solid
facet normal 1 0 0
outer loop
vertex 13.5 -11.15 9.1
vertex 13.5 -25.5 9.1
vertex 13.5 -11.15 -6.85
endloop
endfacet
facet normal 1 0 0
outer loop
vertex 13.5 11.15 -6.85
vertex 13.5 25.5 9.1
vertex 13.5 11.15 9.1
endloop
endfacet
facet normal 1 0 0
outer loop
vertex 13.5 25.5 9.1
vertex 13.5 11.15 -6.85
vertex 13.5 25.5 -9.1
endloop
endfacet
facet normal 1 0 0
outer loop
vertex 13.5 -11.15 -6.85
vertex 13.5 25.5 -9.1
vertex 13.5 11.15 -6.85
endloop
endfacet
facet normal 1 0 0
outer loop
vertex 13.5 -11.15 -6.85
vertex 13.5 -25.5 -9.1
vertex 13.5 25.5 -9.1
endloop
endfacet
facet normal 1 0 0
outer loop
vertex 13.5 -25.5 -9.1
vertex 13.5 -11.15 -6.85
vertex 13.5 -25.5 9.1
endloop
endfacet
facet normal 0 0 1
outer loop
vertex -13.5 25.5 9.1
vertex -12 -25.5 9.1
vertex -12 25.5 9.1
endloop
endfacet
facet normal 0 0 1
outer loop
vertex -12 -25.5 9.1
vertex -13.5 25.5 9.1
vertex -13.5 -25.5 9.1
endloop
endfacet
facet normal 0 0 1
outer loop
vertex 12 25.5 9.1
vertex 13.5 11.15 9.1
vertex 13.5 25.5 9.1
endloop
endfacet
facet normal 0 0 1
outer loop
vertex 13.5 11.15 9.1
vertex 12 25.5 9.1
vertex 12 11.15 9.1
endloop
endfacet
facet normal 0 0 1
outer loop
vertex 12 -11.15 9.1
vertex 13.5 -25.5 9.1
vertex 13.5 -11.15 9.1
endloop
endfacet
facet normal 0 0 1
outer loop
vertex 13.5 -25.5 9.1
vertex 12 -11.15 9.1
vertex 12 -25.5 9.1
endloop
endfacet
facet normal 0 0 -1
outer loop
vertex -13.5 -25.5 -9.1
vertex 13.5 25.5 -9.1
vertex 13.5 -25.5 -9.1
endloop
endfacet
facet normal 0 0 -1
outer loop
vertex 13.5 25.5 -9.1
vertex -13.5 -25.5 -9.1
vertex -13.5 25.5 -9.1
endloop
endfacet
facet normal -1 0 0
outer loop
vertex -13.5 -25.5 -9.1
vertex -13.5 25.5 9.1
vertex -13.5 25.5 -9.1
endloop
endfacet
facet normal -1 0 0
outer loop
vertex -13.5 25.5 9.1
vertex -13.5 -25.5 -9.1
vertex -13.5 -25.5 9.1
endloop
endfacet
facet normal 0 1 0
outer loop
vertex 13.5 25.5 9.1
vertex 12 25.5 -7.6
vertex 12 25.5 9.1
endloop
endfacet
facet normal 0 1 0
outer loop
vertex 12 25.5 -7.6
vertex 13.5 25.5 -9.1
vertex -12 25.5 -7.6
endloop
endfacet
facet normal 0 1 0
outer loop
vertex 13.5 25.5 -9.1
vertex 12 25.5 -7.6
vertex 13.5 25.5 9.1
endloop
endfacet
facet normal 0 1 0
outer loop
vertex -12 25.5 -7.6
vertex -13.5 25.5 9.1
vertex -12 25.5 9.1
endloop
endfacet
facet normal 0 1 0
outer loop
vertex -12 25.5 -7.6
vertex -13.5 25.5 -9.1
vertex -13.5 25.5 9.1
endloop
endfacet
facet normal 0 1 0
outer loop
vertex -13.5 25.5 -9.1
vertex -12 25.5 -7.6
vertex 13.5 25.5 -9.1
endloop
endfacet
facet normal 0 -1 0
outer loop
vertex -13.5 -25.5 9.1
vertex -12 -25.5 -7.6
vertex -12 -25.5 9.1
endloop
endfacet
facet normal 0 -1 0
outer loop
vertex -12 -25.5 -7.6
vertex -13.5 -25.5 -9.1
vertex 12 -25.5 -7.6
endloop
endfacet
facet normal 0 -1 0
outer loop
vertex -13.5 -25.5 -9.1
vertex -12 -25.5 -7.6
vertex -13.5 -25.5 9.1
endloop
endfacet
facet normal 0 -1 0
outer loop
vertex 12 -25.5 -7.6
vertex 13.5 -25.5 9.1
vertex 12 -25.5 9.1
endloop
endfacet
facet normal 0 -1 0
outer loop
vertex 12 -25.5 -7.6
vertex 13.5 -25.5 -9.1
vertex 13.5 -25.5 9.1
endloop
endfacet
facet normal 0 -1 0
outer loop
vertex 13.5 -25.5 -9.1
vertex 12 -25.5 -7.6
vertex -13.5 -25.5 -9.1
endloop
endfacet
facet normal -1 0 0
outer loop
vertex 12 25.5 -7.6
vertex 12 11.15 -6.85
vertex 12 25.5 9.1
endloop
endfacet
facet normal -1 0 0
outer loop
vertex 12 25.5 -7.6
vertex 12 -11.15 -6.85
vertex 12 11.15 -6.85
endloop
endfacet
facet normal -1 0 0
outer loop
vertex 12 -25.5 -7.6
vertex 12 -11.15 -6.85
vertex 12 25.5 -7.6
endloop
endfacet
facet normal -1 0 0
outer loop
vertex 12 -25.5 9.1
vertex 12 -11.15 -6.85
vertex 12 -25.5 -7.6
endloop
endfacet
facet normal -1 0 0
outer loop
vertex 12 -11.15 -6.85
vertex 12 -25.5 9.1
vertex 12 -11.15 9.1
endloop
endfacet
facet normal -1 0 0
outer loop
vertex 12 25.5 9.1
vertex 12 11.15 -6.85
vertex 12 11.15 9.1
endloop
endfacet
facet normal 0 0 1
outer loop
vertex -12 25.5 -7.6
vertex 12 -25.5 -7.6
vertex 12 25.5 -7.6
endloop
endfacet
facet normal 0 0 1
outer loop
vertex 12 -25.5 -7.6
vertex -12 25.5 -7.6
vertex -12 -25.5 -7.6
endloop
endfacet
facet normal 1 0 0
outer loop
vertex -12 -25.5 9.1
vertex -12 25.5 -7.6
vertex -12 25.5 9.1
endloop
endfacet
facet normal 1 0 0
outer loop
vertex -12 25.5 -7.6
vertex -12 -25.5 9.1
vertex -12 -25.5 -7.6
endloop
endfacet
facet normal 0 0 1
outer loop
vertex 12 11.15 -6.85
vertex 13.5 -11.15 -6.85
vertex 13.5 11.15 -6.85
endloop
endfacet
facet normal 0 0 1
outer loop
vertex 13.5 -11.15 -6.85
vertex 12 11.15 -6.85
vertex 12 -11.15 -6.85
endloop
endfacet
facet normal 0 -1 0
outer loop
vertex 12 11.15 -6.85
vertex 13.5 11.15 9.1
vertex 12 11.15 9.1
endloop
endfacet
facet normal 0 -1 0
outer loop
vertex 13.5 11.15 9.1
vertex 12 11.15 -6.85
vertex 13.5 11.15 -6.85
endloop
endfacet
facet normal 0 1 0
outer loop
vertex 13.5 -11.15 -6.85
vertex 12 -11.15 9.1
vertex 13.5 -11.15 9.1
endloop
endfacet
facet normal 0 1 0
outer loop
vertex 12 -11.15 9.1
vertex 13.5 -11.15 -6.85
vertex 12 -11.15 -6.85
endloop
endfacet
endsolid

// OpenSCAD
switch = [50, 19.3, 11.7 + 0.5];

pico = [21, 51, 1.5];
t = 1.5;

body = [pico.x + 2*t, pico.y, switch.z + pico.z + 2*t];

if (false){
    difference(){
        cube(body, center=true);
        translate([0, 0, t/2])
        cube(body + [-4*t, 0, -t], center=true);
        translate([0, 0, body.z/2 - t - pico.z/2])
        cube(pico, center=true);
        translate([switch.x/2, 0, 100/2-t/2])
        cube(switch + [0,0, 100], center=true);
    }
}

difference(){
    difference(){
        cube(body + [2*t, 0, t], center=true);
        translate([0, 0, t/2])
        cube(body, center=true);
        translate([0, 0, body.z/2 - t - pico.z/2])
        cube(pico, center=true);
        translate([switch.x/2, 0, 100/2-t/2])
        cube(switch + [0,3, 100], center=true);
    }
}
